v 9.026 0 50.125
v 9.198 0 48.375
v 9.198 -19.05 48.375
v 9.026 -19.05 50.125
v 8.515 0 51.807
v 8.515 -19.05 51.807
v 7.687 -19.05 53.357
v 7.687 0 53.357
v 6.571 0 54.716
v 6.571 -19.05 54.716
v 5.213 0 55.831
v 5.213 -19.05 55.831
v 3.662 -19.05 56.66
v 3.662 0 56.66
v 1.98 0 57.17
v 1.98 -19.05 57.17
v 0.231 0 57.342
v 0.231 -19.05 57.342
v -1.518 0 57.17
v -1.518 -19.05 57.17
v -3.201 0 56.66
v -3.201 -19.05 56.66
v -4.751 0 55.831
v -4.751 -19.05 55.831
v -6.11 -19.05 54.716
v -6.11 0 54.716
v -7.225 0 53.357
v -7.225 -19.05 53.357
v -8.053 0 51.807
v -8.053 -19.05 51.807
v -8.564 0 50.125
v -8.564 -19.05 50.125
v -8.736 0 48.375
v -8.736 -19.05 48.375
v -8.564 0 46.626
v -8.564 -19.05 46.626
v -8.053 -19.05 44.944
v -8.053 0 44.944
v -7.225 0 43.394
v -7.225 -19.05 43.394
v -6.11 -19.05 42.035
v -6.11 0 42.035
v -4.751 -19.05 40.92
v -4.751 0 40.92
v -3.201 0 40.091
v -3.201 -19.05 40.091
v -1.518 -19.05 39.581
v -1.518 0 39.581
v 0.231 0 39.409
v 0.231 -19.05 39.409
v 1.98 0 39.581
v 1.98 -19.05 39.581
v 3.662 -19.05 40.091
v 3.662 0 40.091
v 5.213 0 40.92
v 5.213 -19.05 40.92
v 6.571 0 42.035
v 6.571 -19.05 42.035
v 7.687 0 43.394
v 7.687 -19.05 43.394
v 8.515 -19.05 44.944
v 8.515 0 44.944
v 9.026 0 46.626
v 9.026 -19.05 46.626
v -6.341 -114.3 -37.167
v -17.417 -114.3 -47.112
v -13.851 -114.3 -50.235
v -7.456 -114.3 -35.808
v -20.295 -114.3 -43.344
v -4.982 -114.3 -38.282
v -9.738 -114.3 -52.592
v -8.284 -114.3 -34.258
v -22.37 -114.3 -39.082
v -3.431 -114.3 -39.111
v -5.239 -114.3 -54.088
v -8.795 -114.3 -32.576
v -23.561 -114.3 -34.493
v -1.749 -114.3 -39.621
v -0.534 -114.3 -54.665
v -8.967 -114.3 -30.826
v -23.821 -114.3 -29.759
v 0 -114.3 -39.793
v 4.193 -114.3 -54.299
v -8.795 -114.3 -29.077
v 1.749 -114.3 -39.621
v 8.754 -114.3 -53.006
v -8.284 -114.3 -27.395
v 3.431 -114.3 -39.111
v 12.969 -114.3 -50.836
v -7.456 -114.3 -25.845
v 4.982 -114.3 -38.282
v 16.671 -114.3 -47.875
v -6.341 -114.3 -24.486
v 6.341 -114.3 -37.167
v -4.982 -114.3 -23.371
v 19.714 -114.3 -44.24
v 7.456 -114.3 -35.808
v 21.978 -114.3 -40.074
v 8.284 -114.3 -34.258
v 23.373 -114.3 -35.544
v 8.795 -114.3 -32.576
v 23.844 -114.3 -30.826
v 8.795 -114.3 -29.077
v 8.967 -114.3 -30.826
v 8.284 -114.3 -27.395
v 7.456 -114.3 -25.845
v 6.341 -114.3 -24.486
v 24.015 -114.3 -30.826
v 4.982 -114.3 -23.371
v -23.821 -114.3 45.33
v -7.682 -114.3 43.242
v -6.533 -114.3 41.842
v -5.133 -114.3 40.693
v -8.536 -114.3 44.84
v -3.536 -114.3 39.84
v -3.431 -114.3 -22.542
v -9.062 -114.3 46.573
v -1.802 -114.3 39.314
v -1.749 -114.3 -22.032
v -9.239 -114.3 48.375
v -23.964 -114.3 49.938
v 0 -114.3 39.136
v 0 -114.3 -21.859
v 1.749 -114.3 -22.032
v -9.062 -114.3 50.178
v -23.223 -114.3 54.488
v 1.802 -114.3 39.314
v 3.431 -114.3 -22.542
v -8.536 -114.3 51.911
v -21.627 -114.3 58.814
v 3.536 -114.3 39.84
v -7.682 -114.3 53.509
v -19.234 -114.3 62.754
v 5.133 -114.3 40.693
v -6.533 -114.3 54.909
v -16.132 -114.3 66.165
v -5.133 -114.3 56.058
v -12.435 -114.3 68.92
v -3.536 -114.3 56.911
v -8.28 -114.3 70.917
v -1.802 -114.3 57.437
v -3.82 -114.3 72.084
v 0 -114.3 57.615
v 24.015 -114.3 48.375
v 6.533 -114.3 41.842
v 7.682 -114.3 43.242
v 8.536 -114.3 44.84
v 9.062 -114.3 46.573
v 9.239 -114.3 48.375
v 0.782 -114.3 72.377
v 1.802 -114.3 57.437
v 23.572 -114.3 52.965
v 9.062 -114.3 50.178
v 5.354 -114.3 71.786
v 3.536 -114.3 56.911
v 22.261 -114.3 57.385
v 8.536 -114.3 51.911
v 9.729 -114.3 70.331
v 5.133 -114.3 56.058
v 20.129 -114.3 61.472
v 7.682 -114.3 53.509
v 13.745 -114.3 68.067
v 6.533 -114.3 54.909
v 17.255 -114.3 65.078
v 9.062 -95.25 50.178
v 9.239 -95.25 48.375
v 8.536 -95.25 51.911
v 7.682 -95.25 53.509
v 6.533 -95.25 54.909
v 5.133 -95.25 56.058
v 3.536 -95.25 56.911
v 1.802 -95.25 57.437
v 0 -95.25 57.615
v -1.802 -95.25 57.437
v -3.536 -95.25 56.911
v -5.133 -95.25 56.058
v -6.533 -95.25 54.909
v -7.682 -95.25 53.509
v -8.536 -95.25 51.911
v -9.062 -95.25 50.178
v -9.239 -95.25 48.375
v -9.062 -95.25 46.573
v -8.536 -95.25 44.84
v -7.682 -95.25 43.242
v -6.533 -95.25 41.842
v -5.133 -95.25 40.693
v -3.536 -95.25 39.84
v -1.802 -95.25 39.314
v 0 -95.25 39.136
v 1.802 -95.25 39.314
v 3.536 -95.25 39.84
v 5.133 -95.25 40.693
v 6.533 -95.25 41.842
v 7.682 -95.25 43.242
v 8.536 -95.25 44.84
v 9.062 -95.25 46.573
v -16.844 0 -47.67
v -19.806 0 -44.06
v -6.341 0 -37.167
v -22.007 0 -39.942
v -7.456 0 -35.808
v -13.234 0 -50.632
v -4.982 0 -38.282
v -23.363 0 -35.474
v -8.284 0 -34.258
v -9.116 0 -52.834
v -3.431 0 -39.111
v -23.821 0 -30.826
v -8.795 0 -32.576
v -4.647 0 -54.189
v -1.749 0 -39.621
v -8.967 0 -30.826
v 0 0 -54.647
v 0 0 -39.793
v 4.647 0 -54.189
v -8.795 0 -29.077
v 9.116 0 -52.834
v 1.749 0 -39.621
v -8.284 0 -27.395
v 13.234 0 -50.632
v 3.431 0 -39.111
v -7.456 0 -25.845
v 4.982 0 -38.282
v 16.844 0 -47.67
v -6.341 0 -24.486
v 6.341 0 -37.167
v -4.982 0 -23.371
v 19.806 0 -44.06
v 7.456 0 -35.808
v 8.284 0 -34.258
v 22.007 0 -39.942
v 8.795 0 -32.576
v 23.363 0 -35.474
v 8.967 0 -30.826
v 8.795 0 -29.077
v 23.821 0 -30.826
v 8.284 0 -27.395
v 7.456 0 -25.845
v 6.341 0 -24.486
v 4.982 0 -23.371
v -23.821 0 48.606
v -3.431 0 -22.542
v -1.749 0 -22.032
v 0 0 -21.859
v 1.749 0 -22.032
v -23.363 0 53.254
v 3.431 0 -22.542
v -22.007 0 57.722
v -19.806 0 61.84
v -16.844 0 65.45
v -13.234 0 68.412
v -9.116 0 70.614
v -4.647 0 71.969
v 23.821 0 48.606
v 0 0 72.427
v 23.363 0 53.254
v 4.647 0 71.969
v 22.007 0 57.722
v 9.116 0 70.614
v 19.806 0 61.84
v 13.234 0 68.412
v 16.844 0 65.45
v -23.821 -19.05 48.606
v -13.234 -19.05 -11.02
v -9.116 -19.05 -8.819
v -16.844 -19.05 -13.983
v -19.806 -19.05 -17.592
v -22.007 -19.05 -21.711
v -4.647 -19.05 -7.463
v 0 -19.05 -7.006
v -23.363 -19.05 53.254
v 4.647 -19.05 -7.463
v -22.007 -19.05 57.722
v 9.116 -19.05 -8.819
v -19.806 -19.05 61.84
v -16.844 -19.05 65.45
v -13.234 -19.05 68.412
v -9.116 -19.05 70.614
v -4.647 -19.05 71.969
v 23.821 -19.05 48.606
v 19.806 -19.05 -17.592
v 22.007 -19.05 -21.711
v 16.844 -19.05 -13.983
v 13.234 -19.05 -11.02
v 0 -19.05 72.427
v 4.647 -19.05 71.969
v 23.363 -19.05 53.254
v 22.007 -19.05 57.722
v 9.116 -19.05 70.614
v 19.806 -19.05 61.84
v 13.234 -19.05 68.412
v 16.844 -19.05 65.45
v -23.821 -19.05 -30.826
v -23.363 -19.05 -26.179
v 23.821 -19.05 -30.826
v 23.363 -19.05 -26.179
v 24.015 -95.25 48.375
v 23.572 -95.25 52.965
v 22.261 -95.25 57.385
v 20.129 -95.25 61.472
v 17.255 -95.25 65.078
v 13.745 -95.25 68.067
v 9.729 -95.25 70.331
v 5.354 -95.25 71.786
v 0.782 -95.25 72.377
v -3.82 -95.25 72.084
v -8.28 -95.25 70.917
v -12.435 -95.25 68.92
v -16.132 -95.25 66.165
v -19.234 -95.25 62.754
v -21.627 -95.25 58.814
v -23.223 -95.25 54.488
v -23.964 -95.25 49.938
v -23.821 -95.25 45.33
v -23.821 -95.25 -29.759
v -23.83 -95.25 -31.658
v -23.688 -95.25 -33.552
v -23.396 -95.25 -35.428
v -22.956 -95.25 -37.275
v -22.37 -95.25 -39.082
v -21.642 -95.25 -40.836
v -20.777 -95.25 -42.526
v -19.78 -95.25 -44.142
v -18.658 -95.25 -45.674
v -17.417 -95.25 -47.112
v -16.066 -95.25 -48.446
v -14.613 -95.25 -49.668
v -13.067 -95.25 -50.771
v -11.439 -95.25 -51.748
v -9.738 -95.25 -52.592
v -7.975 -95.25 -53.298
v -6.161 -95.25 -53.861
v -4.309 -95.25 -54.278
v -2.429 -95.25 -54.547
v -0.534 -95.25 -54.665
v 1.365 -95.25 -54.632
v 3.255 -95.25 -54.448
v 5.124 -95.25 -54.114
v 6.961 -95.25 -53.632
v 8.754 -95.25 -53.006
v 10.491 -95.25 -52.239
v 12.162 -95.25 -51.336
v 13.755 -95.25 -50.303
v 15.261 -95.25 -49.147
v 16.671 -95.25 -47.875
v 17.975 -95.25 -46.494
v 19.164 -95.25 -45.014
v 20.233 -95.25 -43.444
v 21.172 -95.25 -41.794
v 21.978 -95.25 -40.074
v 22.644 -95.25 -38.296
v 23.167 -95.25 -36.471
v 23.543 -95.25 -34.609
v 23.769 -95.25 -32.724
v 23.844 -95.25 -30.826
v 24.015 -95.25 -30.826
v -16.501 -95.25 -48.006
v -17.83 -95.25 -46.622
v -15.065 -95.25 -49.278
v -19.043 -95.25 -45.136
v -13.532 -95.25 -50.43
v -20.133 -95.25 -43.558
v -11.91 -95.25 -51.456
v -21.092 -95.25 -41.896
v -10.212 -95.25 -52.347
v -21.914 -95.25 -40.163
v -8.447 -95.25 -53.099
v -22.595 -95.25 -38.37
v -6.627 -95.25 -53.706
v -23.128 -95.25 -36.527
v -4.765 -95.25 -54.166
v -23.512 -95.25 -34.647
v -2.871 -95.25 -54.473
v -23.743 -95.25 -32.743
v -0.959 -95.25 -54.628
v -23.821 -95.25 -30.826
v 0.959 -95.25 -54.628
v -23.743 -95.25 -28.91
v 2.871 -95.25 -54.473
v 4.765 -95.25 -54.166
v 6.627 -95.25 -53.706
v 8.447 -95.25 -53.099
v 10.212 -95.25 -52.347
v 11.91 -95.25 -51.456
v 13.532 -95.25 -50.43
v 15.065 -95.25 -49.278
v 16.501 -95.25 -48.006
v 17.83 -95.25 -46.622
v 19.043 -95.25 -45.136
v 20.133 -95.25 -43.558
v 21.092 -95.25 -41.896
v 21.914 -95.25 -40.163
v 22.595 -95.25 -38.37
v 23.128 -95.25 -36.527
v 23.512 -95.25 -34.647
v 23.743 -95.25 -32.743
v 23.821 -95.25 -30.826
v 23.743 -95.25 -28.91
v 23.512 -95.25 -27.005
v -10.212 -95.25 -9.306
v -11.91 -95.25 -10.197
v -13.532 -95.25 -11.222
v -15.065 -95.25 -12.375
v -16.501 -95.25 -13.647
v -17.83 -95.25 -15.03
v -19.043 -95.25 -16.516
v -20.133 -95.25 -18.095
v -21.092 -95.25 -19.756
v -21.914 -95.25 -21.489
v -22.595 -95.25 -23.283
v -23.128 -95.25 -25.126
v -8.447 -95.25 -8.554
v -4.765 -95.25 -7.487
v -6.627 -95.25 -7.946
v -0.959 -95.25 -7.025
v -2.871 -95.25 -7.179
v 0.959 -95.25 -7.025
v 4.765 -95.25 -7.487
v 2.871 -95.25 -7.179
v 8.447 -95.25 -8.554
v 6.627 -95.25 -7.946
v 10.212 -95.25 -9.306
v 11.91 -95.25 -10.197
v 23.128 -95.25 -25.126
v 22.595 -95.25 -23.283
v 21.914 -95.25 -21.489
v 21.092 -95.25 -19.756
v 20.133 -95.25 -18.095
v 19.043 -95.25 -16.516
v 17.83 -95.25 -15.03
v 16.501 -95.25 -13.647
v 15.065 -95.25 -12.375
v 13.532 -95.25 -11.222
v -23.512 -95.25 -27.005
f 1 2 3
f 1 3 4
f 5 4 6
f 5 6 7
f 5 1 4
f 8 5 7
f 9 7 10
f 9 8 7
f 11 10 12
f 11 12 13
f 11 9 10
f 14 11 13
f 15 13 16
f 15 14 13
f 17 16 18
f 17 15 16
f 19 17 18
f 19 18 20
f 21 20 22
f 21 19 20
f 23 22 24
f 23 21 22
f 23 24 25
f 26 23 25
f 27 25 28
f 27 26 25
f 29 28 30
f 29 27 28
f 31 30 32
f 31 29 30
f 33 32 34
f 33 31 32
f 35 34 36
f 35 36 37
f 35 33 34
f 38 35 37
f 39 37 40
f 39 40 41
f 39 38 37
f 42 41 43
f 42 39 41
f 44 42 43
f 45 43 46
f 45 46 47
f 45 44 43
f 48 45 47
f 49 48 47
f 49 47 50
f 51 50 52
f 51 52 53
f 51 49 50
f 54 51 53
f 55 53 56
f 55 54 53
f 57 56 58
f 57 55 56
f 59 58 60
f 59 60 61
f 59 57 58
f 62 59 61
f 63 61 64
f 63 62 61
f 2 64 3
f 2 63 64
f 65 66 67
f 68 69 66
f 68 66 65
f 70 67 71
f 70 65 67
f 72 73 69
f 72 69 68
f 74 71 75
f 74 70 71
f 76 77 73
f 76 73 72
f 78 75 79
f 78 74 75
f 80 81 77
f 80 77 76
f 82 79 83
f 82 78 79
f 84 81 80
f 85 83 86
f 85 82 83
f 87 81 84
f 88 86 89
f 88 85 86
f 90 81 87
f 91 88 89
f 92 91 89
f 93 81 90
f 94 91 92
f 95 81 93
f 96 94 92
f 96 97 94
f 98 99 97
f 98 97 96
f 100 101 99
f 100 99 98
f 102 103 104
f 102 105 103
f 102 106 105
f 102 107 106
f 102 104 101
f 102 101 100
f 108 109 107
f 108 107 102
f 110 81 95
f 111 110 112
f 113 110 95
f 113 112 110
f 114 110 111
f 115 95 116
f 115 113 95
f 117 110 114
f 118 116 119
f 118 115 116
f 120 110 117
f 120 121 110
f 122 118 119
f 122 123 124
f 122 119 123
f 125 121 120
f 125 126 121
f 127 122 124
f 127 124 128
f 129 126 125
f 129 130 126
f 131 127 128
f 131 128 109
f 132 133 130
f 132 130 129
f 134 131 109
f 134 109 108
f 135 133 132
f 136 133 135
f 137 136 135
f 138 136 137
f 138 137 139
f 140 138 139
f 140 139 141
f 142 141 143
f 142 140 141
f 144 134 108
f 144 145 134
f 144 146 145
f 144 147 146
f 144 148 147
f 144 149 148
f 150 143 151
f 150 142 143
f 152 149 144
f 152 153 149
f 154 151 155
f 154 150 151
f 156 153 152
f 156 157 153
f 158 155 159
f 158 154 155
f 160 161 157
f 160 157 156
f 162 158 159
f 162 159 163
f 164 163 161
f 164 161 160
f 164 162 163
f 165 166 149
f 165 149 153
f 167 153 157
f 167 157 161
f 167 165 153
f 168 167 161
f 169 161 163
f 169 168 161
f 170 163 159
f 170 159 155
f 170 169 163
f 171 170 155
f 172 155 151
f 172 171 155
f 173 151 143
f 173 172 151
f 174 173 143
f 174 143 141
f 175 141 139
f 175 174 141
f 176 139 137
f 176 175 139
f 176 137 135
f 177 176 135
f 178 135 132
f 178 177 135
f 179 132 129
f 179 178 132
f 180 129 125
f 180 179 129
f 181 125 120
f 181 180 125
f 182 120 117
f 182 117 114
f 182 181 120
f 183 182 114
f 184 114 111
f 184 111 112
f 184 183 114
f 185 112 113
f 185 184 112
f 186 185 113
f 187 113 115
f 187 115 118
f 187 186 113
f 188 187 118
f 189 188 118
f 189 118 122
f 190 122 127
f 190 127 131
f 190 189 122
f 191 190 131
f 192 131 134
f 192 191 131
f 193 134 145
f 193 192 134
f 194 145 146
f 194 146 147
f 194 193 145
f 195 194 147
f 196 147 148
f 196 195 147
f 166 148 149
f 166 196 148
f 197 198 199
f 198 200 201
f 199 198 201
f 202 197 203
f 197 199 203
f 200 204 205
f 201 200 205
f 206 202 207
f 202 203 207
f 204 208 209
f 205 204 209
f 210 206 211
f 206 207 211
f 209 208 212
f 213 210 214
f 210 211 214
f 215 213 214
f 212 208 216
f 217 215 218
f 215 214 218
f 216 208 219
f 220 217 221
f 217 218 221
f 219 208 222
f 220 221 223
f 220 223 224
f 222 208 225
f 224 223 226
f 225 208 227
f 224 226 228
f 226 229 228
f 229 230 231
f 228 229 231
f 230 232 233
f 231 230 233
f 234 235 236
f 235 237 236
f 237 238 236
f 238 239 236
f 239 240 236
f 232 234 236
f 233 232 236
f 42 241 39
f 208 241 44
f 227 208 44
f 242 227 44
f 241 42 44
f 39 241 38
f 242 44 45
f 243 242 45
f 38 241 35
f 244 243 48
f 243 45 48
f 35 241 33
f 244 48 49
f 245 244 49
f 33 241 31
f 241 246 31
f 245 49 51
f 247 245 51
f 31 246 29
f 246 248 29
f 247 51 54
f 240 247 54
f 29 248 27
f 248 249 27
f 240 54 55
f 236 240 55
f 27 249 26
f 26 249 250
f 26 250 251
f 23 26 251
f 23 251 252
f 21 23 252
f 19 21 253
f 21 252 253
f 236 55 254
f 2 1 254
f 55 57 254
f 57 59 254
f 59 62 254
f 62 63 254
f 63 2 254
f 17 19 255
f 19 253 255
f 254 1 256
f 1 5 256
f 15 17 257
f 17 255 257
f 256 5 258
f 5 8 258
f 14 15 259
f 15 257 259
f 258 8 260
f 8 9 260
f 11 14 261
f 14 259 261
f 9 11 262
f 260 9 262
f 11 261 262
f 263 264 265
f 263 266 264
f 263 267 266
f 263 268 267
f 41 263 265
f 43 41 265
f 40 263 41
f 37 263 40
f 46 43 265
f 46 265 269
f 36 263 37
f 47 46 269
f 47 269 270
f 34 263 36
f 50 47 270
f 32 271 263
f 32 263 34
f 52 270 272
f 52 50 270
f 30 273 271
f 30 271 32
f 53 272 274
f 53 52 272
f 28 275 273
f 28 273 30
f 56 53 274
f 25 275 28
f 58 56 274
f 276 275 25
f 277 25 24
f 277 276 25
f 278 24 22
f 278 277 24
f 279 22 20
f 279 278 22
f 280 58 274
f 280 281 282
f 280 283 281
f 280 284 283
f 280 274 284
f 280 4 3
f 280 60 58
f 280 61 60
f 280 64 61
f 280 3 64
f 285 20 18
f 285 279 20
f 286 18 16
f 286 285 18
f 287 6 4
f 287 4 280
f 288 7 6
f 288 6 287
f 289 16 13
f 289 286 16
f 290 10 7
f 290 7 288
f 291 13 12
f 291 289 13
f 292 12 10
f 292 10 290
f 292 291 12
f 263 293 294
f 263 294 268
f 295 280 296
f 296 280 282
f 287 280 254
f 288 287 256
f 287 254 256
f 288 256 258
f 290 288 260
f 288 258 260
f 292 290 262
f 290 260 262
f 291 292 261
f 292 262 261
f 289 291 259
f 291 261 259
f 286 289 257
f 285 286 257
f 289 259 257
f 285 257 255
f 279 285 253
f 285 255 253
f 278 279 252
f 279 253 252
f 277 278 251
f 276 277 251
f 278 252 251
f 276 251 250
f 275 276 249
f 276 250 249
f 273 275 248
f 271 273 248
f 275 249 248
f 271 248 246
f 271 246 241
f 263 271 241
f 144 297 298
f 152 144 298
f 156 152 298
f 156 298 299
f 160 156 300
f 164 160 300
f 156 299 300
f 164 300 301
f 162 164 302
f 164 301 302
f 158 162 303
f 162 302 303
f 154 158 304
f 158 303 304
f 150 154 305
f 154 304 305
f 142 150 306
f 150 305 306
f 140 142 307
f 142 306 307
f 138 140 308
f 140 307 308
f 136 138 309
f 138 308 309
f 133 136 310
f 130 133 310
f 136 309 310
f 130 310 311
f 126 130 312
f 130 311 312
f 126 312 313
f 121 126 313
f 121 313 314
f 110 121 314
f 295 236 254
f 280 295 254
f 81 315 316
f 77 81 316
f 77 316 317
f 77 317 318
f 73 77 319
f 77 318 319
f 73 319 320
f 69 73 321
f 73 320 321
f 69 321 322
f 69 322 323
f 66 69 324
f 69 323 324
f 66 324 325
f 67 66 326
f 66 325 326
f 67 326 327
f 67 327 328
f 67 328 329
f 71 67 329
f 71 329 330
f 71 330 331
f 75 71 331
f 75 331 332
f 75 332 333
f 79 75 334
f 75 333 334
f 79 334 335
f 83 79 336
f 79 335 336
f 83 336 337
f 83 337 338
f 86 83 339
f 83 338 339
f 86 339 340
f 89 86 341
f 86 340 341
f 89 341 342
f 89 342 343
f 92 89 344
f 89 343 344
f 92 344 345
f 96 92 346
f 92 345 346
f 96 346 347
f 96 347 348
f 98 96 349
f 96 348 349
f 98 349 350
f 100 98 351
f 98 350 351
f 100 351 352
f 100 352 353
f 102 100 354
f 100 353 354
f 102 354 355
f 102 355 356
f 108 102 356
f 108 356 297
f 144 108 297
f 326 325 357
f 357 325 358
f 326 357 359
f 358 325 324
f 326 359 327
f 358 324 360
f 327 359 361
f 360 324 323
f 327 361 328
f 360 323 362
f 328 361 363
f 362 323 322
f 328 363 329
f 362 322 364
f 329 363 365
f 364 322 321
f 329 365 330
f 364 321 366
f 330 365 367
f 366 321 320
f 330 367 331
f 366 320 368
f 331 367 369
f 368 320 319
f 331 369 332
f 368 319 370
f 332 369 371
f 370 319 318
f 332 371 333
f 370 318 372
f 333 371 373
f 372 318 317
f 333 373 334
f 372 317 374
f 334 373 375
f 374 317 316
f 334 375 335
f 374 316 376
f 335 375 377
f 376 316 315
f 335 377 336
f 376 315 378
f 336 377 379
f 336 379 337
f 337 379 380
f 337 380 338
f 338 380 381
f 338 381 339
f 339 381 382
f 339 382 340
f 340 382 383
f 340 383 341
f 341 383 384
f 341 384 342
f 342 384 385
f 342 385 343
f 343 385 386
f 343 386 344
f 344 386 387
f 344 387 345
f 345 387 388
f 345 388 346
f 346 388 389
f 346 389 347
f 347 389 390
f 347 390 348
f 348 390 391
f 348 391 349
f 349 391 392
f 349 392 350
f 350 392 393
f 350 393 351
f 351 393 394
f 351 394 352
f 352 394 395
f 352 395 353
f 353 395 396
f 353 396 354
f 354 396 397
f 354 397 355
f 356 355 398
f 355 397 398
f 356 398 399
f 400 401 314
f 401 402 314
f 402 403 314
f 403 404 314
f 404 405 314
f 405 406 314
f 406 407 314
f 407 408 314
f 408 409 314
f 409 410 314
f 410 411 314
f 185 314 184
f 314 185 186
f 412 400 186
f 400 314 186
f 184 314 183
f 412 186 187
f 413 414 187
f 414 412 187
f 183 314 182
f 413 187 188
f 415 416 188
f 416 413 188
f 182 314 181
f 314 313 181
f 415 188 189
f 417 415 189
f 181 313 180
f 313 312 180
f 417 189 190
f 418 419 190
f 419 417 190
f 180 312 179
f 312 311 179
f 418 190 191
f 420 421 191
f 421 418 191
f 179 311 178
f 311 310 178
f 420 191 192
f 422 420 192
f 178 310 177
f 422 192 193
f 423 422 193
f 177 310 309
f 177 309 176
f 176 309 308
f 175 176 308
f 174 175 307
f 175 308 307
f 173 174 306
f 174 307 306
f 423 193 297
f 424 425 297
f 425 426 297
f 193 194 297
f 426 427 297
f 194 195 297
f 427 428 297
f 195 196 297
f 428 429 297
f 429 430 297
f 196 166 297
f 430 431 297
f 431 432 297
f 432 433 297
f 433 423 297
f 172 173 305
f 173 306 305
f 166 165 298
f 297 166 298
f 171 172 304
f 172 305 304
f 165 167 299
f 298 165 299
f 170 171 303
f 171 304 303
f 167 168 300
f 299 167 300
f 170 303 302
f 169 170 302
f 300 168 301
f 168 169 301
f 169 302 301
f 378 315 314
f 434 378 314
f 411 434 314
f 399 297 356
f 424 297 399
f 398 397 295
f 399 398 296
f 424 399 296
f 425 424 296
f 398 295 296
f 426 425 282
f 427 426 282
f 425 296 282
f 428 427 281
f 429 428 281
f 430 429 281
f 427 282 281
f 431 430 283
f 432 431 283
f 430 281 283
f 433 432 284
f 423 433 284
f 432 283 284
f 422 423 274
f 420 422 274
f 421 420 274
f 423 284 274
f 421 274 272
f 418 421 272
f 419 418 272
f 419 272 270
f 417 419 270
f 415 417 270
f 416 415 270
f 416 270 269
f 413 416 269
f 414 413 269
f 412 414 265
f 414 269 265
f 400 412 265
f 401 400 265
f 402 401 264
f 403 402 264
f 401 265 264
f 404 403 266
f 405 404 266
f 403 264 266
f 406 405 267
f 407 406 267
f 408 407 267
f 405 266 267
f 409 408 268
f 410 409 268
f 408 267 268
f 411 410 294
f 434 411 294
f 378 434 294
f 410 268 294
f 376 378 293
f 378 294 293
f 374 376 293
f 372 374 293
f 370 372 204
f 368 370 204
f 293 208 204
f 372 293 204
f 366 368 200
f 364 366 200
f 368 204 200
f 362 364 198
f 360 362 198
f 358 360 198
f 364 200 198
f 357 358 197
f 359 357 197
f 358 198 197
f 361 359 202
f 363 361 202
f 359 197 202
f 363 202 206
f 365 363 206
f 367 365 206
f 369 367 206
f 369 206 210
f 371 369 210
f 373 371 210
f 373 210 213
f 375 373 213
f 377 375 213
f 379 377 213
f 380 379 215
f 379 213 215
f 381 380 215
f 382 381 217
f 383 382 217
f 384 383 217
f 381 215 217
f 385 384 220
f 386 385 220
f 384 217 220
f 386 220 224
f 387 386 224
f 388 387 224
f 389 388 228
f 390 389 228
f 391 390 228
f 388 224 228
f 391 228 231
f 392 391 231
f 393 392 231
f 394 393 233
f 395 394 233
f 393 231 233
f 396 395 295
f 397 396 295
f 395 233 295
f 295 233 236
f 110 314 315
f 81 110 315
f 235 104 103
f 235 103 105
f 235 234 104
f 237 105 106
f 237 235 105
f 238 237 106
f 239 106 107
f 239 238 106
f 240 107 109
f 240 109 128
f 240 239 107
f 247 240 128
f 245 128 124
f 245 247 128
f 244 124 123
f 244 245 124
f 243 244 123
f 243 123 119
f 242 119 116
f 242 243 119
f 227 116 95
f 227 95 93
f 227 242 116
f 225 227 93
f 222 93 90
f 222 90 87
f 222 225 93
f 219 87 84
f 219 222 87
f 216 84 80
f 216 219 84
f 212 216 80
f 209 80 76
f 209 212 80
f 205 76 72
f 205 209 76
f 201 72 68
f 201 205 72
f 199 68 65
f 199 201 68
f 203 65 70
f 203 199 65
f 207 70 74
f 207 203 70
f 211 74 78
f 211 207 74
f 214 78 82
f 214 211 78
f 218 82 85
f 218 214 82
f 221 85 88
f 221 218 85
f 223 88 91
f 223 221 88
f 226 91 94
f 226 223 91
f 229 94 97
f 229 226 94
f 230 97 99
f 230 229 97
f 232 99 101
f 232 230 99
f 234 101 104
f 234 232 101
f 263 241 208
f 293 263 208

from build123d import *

# Parameters (mm, degrees)
F0_R     = 8.9668874309
F1_DEPTH = 19.05
F2_R     = 8.9668874309
F3_DEPTH = 76.2
F4_R     = 9.2392486584
F5_DEPTH = 19.05
F6_DEPTH = 19.05


with BuildPart() as f1:
    # F0 (on Front) → F1 (new body)
    with BuildSketch(Plane.XZ):
        with BuildLine():
            Line((-23.8205983585, 48.6063640565), (-23.8205983585, -30.8263637125))
            ThreePointArc((-23.8205983585, -30.8263637125), (0, -54.6469620711), (23.8205983585, -30.8263637125))
            Line((23.8205983585, -30.8263637125), (23.8205983585, 48.6063640565))
            ThreePointArc((23.8205983585, 48.6063640565), (0, 72.426962415), (-23.8205983585, 48.6063640565))
        make_face()
        with Locations((0, -30.8263637125)):
            Circle(F0_R, mode=Mode.SUBTRACT)
        with Locations((0.2309088741, 48.3754538)):
            Circle(F0_R, mode=Mode.SUBTRACT)
    extrude(amount=F1_DEPTH)

    # F2 (on face) → F3 (join)
    with BuildSketch(Plane.XZ.offset(19.05)):
        with BuildLine():
            ThreePointArc((-23.8205983585, -30.8263637125), (0, -54.6469620711), (23.8205983585, -30.8263637125))
            ThreePointArc((23.8205983585, -30.8263637125), (0, -7.005765354), (-23.8205983585, -30.8263637125))
        make_face()
        with Locations((0, -30.8263637125)):
            Circle(F2_R, mode=Mode.SUBTRACT)
    extrude(amount=F3_DEPTH)

    # F4 (on face) → F5 (join)
    with BuildSketch(Plane.XZ.offset(95.25)):
        with BuildLine():
            Line((-23.8205983585, 45.3295558312), (-23.8205983585, -29.759446989))
            ThreePointArc((-23.8205983585, -29.759446989), (-0.5335919833, -54.6648724127), (23.8444798109, -30.8263637125))
            Line((23.8444798109, -30.8263637125), (24.0145456046, -30.8263637125))
            Line((24.0145456046, -30.8263637125), (24.0145456046, 48.3754538))
            ThreePointArc((24.0145456046, 48.3754538), (-1.5260332541, 72.3414635451), (-23.8205983585, 45.3295558312))
        make_face()
        with BuildLine():
            ThreePointArc((23.8205983585, -30.8263637125), (0, -54.6469620711), (-23.8205983585, -30.8263637125))
            ThreePointArc((-23.8205983585, -30.8263637125), (0, -7.005765354), (23.8205983585, -30.8263637125))
        make_face(mode=Mode.SUBTRACT)
        with Locations((0, 48.3754538)):
            Circle(F4_R, mode=Mode.SUBTRACT)
    extrude(amount=F5_DEPTH)

    # F6 (add): a face of the model
    f6_faces = [f1.faces().sort_by_distance(p)[0] for p in [
        (-23.1468500933, -95.25, -30.8263637125),
    ]]
    extrude(f6_faces, amount=F6_DEPTH)


solid = f1.part
